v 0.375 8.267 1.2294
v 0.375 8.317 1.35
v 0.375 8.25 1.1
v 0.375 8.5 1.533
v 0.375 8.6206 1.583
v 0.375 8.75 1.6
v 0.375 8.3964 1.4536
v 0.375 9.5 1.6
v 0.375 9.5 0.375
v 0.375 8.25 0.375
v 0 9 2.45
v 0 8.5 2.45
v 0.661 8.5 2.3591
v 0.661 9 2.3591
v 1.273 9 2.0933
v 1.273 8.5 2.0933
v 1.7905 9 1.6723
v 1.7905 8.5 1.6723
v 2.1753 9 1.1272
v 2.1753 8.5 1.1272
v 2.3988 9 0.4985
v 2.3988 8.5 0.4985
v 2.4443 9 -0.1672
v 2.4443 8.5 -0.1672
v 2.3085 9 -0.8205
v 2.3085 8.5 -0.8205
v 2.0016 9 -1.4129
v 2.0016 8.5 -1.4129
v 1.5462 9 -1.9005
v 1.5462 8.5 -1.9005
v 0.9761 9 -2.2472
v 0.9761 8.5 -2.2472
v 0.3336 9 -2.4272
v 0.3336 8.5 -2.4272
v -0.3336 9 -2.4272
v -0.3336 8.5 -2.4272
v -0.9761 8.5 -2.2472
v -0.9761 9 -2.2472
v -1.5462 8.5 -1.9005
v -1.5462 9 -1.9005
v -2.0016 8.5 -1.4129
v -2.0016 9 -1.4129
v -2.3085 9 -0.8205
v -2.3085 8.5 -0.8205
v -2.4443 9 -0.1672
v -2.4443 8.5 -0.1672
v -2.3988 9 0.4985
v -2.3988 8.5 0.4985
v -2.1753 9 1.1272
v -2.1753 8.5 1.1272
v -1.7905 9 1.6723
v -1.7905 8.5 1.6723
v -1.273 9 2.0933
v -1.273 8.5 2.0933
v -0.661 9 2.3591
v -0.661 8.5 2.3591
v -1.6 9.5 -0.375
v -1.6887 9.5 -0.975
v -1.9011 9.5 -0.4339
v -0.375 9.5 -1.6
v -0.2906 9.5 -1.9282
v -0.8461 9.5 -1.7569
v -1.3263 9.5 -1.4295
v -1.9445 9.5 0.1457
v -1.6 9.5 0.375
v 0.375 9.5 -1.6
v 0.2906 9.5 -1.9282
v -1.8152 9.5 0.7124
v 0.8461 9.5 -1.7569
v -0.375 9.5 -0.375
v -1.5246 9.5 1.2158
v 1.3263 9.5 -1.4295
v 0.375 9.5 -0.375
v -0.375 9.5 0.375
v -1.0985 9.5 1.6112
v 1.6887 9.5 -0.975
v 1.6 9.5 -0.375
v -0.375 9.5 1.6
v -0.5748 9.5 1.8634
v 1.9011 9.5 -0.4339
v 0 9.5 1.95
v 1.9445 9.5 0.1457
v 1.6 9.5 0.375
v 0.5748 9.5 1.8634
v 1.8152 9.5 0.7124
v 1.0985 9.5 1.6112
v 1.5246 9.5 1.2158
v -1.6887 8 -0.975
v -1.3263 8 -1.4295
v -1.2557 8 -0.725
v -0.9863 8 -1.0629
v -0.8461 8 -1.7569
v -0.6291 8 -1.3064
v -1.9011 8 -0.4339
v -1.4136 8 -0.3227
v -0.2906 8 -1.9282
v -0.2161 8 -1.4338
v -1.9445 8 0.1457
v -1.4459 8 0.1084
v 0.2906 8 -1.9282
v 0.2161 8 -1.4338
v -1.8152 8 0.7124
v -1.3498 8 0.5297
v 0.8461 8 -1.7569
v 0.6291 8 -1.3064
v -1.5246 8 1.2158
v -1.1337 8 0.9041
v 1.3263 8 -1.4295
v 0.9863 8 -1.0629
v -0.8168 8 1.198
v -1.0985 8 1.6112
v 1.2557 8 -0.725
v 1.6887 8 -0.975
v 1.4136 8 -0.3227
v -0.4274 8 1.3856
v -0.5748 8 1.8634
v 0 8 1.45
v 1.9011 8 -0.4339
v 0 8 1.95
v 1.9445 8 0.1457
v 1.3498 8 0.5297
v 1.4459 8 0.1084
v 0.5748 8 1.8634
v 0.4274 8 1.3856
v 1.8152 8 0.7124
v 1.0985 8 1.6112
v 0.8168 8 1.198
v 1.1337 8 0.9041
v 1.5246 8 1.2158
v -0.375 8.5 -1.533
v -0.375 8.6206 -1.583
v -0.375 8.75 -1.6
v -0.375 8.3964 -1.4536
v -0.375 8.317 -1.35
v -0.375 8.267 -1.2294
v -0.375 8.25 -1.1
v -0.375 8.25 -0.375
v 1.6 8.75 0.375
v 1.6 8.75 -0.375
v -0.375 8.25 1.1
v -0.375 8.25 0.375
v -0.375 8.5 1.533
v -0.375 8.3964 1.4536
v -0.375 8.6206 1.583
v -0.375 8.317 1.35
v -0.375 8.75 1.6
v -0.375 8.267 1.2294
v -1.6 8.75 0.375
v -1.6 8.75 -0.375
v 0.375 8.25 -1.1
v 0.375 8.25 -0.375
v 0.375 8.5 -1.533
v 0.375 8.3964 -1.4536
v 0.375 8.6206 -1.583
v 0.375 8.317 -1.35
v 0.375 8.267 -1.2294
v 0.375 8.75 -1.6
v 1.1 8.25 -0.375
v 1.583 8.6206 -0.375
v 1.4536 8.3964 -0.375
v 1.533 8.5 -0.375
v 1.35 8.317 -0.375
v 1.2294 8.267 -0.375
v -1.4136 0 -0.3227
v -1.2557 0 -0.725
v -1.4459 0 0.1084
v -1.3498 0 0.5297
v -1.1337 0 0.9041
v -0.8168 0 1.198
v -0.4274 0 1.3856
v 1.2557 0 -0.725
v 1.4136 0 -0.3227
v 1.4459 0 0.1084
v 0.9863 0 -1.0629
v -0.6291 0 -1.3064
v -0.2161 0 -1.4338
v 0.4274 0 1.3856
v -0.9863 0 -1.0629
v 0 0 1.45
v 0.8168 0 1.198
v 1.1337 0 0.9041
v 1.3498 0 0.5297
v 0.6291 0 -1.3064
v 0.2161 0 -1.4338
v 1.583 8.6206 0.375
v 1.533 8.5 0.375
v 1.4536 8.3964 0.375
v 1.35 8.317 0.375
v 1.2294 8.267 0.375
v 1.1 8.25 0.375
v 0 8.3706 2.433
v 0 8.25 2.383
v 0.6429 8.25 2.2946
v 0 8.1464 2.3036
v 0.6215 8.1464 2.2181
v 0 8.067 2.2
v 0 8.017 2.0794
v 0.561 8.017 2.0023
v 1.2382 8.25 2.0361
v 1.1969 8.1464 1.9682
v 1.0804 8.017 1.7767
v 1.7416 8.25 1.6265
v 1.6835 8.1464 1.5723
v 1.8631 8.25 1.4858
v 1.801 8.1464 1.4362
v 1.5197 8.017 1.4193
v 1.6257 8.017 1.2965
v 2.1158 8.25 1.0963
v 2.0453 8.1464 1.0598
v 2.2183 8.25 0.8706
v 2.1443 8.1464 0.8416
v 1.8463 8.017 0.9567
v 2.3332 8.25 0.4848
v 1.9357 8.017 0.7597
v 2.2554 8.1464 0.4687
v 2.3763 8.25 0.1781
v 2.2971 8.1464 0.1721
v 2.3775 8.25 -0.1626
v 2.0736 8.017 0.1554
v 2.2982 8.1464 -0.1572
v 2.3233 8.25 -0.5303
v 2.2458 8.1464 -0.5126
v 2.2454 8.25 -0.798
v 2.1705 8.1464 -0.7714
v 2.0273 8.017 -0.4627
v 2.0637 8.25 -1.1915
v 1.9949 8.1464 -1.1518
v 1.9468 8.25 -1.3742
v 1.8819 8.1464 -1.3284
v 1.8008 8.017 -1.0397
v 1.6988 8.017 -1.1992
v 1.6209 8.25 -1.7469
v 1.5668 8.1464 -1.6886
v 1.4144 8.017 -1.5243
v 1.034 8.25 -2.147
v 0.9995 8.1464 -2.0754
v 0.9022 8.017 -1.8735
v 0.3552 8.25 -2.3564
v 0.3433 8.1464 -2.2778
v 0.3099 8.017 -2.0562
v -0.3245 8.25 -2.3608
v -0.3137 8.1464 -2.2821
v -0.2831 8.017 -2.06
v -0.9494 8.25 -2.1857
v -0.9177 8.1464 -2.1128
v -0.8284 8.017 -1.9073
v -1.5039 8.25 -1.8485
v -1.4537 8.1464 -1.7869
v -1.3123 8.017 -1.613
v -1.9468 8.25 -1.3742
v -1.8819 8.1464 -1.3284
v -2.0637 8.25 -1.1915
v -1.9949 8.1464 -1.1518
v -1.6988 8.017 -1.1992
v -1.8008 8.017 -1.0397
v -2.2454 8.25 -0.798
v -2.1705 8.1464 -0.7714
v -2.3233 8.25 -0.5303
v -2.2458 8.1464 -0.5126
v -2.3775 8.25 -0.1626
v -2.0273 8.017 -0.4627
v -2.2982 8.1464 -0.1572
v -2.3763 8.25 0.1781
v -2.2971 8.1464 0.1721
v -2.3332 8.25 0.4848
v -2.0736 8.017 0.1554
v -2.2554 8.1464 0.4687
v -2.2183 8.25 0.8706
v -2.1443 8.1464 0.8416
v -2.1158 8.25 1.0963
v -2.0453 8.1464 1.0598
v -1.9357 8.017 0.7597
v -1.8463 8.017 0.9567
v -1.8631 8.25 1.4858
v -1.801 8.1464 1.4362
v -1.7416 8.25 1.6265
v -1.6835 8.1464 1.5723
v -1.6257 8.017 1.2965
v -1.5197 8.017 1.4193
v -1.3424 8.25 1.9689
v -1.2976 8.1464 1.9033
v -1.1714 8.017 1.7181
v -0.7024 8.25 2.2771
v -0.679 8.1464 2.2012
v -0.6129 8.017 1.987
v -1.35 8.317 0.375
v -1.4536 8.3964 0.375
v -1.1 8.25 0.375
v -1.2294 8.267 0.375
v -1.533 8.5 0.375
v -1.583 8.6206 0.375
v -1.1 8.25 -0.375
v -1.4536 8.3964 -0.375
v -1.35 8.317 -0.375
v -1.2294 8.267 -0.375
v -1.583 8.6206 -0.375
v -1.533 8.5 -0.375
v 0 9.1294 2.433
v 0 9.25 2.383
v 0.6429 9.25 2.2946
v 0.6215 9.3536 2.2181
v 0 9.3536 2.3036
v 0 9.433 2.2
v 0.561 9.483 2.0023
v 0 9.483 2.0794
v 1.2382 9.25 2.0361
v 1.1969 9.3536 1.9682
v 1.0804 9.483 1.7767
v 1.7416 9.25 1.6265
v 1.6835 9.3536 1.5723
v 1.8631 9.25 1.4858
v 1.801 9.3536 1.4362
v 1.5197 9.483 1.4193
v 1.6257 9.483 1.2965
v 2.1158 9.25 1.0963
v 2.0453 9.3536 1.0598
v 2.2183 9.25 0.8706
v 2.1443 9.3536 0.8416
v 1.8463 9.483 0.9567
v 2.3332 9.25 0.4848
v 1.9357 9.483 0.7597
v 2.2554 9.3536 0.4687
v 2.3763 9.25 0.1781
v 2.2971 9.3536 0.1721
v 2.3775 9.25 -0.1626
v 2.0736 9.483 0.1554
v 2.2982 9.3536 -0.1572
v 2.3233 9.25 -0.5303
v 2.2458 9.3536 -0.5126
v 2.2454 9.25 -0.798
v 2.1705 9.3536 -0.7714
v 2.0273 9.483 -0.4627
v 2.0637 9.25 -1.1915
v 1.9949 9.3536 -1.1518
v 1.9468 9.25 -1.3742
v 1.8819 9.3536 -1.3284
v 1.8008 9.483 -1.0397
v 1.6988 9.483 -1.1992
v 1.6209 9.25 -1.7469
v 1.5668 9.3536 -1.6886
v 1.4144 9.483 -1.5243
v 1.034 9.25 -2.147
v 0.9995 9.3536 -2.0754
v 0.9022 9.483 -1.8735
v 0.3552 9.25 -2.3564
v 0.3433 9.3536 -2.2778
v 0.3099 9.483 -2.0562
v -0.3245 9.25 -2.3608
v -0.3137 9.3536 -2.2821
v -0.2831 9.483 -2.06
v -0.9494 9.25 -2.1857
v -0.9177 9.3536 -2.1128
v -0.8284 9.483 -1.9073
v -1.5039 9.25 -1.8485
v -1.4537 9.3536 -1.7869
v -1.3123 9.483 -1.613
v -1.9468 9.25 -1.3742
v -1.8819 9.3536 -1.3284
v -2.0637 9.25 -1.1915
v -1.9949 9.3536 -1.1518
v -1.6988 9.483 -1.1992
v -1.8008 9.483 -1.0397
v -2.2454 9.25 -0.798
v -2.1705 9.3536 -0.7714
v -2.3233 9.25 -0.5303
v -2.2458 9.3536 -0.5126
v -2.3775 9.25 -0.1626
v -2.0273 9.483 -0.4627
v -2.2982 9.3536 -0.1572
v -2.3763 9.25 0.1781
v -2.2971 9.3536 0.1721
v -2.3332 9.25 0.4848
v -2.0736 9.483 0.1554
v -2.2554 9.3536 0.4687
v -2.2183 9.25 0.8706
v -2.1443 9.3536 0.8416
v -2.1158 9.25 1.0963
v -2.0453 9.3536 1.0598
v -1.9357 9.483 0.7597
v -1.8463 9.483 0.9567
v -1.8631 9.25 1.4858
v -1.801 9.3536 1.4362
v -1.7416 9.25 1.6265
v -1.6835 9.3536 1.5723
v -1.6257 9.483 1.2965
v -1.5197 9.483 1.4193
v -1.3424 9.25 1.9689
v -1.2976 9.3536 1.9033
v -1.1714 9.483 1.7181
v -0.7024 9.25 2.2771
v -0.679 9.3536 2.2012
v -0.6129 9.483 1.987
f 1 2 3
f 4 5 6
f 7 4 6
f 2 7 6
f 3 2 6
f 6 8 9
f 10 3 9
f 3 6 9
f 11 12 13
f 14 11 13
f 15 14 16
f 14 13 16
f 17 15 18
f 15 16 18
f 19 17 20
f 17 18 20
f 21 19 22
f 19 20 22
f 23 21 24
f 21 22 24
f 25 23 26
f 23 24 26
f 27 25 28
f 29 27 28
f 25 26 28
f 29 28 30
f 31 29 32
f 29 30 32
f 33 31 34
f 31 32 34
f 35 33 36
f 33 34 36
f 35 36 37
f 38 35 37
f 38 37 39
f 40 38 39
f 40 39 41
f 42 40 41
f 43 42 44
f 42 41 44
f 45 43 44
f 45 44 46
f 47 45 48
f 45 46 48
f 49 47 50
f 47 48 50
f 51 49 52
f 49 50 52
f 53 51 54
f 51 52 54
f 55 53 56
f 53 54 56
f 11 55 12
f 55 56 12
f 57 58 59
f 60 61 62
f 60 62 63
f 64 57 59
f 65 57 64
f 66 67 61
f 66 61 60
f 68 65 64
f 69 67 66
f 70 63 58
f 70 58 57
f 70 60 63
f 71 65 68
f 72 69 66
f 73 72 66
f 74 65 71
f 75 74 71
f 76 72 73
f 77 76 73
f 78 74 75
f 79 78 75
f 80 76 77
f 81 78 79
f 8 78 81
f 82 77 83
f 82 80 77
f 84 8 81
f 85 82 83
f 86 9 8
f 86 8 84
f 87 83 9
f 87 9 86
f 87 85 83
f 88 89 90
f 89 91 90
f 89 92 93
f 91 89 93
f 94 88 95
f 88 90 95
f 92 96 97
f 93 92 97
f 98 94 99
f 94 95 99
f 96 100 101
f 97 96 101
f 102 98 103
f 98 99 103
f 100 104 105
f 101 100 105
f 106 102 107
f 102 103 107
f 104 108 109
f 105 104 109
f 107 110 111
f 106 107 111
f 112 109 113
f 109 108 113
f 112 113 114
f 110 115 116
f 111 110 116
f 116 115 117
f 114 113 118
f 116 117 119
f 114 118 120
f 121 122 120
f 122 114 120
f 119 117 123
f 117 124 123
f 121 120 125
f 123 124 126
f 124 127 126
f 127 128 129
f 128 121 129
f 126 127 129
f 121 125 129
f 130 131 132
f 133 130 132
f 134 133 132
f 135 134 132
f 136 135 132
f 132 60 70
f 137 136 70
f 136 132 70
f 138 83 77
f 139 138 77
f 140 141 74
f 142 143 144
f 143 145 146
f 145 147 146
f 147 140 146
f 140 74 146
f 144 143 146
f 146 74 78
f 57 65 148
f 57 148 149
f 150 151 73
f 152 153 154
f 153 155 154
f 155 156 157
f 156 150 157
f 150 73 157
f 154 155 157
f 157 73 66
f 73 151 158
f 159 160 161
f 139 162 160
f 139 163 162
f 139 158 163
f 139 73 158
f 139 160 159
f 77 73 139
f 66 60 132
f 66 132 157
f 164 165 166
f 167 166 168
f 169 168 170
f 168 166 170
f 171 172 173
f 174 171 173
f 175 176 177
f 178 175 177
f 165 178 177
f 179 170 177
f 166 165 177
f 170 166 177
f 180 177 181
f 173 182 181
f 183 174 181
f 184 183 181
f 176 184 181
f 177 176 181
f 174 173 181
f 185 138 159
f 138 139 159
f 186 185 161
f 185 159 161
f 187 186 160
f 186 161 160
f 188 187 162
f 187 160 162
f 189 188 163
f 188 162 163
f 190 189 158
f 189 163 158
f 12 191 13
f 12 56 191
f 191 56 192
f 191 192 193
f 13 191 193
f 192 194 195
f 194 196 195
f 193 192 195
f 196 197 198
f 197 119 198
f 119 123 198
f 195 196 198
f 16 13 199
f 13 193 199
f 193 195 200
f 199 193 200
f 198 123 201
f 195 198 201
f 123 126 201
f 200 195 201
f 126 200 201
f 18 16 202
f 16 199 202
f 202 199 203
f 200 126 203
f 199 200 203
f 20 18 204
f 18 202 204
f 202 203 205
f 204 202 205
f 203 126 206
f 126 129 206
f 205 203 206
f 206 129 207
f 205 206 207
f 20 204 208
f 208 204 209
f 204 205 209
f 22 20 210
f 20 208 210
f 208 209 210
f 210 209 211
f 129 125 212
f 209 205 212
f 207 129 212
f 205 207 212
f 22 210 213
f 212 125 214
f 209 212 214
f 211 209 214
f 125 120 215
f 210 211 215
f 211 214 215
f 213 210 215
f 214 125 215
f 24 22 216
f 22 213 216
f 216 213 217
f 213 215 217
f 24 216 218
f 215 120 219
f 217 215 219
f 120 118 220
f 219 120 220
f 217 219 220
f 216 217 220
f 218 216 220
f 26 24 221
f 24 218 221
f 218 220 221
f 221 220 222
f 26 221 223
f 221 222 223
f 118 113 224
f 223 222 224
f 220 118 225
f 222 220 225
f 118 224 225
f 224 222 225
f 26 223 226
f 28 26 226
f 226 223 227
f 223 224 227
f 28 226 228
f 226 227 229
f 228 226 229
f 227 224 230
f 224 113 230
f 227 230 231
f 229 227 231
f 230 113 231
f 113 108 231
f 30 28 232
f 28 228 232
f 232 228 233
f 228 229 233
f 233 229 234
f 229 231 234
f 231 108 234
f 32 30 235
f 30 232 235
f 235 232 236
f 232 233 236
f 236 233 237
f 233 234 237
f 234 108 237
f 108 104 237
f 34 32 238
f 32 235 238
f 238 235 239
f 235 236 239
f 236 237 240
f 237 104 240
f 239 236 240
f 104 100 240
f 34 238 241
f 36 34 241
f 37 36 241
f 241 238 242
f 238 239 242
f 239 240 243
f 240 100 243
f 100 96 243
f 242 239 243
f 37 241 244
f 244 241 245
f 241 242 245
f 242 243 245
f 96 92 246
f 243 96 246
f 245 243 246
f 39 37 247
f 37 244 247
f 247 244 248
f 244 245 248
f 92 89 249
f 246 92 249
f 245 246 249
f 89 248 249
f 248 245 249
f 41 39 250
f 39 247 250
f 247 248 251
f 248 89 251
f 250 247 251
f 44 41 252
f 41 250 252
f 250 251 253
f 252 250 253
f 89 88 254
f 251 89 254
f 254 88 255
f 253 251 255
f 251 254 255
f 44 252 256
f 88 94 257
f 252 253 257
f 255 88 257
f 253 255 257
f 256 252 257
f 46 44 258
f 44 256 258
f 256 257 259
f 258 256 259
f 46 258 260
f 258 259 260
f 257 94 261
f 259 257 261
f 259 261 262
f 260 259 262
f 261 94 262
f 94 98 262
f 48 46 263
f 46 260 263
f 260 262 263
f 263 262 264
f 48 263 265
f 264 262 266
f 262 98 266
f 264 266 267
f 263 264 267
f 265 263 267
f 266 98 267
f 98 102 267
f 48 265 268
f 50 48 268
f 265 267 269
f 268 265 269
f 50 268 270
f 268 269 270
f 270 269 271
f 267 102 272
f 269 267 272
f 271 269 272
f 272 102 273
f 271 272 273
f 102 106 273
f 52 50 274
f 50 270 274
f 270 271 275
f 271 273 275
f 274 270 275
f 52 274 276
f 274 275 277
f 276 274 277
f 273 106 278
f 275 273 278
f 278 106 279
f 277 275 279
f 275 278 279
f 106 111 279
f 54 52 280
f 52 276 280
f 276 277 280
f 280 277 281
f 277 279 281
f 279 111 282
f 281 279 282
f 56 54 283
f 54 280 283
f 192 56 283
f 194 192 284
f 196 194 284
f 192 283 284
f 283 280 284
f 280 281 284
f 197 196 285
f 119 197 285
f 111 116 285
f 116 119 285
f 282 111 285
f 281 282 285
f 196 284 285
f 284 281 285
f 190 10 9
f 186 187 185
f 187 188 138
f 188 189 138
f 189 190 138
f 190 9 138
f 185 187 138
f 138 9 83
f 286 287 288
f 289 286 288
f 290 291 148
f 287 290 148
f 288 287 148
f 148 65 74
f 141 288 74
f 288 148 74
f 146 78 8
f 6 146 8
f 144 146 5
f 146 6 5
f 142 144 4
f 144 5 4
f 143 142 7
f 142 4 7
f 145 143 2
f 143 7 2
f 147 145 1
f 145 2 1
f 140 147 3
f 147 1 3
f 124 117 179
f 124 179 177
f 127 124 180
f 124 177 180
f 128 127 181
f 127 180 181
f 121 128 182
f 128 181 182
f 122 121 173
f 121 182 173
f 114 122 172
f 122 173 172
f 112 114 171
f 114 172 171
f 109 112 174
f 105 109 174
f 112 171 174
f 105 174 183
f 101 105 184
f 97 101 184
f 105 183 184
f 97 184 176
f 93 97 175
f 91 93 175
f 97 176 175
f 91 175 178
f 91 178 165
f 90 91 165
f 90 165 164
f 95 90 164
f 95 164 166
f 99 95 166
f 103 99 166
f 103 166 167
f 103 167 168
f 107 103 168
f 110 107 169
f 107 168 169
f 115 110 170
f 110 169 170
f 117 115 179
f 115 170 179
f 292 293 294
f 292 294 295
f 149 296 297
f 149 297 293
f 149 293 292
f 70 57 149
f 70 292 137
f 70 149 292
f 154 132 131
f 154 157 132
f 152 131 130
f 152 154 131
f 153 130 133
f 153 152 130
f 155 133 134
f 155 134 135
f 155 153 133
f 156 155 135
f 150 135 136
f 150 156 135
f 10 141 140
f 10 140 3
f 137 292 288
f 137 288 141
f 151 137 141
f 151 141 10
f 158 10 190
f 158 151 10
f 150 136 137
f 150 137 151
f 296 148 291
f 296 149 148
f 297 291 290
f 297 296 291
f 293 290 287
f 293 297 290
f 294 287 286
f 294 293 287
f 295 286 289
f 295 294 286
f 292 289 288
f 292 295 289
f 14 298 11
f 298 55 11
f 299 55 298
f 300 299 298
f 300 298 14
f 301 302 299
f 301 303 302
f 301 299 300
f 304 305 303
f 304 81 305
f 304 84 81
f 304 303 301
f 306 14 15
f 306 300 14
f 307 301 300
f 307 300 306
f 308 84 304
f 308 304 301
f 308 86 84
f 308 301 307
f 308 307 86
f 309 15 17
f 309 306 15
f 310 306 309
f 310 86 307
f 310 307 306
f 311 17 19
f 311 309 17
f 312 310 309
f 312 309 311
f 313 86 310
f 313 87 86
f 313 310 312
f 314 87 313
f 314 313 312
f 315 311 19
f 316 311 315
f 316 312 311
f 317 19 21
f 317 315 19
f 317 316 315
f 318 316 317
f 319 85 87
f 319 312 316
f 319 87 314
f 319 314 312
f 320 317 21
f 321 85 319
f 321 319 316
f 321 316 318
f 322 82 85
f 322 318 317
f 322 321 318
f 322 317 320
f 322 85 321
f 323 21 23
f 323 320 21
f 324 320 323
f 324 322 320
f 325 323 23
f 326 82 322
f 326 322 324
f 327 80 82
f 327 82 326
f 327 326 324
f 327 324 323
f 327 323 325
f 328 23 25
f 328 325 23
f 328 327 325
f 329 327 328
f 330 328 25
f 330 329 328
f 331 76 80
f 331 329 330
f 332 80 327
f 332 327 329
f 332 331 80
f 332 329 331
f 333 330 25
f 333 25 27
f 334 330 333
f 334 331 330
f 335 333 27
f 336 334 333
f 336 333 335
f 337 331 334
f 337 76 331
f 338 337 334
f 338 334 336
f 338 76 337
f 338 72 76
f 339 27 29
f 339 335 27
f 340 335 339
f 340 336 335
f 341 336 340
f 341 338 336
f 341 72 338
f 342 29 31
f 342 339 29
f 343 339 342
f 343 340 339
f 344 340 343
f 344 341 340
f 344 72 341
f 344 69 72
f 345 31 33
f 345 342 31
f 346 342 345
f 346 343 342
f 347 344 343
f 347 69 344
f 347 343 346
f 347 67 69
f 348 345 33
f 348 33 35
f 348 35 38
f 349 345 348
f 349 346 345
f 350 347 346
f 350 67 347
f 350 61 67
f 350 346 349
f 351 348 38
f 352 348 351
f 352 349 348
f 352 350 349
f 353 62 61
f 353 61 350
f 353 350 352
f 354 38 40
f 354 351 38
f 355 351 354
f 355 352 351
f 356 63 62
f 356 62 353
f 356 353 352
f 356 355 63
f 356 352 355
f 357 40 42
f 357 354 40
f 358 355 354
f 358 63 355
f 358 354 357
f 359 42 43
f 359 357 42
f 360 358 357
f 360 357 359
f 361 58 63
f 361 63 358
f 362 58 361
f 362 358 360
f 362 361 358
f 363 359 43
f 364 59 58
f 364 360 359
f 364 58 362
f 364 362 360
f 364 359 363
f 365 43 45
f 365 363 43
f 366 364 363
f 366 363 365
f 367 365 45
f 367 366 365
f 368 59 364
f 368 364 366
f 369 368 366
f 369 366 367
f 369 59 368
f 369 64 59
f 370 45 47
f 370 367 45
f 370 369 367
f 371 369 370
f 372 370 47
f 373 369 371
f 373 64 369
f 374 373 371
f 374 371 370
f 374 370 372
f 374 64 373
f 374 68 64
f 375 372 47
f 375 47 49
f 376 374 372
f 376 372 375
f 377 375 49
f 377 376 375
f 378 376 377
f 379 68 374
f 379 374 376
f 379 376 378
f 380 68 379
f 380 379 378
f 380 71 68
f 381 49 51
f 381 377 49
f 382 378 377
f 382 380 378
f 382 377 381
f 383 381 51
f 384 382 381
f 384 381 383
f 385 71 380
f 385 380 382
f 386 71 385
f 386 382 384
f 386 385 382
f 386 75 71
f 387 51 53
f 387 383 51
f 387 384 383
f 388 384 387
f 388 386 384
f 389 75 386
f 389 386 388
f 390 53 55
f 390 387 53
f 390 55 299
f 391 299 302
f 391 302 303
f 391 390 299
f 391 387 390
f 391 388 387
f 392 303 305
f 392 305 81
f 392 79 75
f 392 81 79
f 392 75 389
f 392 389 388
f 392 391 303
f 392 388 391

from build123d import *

# Parameters (mm, degrees)
SKETCH1_R           = 1.45
BOSS_EXTRUDE1_DEPTH = 8
SKETCH2_R           = 2.45
BOSS_EXTRUDE2_DEPTH = 1.5
FILLET1_R           = 0.5
SKETCH3_W           = 0.75
SKETCH3_H           = 1.225
SKETCH3_H_2         = 0.75
SKETCH3_W_2         = 1.225
CUT_EXTRUDE1_DEPTH  = 1.25
FILLET4_R           = 0.5


with BuildPart() as part:
    # Sketch1 → Boss-Extrude1 (new body)
    with BuildSketch(Plane(origin=(0, 0, 0), x_dir=(1, 0, 0), z_dir=(0, 1, 0))):
        with Locations(Location((0, 0, 0), (0, 0, 270))):
            Circle(SKETCH1_R)
    extrude(amount=BOSS_EXTRUDE1_DEPTH)

    # Sketch2 → Boss-Extrude2 (add)
    with BuildSketch(Plane(origin=(0, 8, 0), x_dir=(1, 0, 0), z_dir=(0, 1, 0))):
        with Locations(Location((0, 0, 0), (0, 0, 270))):
            Circle(SKETCH2_R)
    extrude(amount=BOSS_EXTRUDE2_DEPTH)

    # Fillet1
    fillet1_edges = [part.edges().sort_by_distance(p)[0] for p in [
        (0, 8, -2.45),
        (0, 9.5, -2.45),
    ]]
    fillet(fillet1_edges, radius=FILLET1_R)

    # Sketch3 → Cut-Extrude1 (cut)
    with BuildSketch(Plane(origin=(0, 9.5, 0), x_dir=(1, 0, 0), z_dir=(0, 1, 0))):
        with Locations((0, 0.9875)):
            Rectangle(SKETCH3_W, SKETCH3_H)
        Rectangle(SKETCH3_W, SKETCH3_H_2)
        with Locations((0, -0.9875)):
            Rectangle(SKETCH3_W, SKETCH3_H)
        with Locations((0.9875, 0)):
            Rectangle(SKETCH3_W_2, SKETCH3_H_2)
        with Locations((-0.9875, 0)):
            Rectangle(SKETCH3_W_2, SKETCH3_H_2)
    extrude(amount=-CUT_EXTRUDE1_DEPTH, mode=Mode.SUBTRACT)

    # Fillet4
    fillet4_edges = [part.edges().sort_by_distance(p)[0] for p in [
        (0, 8.25, 1.6),
        (-1.6, 8.25, 0),
        (0, 8.25, -1.6),
        (1.6, 8.25, 0),
    ]]
    fillet(fillet4_edges, radius=FILLET4_R)


solid = part.part
